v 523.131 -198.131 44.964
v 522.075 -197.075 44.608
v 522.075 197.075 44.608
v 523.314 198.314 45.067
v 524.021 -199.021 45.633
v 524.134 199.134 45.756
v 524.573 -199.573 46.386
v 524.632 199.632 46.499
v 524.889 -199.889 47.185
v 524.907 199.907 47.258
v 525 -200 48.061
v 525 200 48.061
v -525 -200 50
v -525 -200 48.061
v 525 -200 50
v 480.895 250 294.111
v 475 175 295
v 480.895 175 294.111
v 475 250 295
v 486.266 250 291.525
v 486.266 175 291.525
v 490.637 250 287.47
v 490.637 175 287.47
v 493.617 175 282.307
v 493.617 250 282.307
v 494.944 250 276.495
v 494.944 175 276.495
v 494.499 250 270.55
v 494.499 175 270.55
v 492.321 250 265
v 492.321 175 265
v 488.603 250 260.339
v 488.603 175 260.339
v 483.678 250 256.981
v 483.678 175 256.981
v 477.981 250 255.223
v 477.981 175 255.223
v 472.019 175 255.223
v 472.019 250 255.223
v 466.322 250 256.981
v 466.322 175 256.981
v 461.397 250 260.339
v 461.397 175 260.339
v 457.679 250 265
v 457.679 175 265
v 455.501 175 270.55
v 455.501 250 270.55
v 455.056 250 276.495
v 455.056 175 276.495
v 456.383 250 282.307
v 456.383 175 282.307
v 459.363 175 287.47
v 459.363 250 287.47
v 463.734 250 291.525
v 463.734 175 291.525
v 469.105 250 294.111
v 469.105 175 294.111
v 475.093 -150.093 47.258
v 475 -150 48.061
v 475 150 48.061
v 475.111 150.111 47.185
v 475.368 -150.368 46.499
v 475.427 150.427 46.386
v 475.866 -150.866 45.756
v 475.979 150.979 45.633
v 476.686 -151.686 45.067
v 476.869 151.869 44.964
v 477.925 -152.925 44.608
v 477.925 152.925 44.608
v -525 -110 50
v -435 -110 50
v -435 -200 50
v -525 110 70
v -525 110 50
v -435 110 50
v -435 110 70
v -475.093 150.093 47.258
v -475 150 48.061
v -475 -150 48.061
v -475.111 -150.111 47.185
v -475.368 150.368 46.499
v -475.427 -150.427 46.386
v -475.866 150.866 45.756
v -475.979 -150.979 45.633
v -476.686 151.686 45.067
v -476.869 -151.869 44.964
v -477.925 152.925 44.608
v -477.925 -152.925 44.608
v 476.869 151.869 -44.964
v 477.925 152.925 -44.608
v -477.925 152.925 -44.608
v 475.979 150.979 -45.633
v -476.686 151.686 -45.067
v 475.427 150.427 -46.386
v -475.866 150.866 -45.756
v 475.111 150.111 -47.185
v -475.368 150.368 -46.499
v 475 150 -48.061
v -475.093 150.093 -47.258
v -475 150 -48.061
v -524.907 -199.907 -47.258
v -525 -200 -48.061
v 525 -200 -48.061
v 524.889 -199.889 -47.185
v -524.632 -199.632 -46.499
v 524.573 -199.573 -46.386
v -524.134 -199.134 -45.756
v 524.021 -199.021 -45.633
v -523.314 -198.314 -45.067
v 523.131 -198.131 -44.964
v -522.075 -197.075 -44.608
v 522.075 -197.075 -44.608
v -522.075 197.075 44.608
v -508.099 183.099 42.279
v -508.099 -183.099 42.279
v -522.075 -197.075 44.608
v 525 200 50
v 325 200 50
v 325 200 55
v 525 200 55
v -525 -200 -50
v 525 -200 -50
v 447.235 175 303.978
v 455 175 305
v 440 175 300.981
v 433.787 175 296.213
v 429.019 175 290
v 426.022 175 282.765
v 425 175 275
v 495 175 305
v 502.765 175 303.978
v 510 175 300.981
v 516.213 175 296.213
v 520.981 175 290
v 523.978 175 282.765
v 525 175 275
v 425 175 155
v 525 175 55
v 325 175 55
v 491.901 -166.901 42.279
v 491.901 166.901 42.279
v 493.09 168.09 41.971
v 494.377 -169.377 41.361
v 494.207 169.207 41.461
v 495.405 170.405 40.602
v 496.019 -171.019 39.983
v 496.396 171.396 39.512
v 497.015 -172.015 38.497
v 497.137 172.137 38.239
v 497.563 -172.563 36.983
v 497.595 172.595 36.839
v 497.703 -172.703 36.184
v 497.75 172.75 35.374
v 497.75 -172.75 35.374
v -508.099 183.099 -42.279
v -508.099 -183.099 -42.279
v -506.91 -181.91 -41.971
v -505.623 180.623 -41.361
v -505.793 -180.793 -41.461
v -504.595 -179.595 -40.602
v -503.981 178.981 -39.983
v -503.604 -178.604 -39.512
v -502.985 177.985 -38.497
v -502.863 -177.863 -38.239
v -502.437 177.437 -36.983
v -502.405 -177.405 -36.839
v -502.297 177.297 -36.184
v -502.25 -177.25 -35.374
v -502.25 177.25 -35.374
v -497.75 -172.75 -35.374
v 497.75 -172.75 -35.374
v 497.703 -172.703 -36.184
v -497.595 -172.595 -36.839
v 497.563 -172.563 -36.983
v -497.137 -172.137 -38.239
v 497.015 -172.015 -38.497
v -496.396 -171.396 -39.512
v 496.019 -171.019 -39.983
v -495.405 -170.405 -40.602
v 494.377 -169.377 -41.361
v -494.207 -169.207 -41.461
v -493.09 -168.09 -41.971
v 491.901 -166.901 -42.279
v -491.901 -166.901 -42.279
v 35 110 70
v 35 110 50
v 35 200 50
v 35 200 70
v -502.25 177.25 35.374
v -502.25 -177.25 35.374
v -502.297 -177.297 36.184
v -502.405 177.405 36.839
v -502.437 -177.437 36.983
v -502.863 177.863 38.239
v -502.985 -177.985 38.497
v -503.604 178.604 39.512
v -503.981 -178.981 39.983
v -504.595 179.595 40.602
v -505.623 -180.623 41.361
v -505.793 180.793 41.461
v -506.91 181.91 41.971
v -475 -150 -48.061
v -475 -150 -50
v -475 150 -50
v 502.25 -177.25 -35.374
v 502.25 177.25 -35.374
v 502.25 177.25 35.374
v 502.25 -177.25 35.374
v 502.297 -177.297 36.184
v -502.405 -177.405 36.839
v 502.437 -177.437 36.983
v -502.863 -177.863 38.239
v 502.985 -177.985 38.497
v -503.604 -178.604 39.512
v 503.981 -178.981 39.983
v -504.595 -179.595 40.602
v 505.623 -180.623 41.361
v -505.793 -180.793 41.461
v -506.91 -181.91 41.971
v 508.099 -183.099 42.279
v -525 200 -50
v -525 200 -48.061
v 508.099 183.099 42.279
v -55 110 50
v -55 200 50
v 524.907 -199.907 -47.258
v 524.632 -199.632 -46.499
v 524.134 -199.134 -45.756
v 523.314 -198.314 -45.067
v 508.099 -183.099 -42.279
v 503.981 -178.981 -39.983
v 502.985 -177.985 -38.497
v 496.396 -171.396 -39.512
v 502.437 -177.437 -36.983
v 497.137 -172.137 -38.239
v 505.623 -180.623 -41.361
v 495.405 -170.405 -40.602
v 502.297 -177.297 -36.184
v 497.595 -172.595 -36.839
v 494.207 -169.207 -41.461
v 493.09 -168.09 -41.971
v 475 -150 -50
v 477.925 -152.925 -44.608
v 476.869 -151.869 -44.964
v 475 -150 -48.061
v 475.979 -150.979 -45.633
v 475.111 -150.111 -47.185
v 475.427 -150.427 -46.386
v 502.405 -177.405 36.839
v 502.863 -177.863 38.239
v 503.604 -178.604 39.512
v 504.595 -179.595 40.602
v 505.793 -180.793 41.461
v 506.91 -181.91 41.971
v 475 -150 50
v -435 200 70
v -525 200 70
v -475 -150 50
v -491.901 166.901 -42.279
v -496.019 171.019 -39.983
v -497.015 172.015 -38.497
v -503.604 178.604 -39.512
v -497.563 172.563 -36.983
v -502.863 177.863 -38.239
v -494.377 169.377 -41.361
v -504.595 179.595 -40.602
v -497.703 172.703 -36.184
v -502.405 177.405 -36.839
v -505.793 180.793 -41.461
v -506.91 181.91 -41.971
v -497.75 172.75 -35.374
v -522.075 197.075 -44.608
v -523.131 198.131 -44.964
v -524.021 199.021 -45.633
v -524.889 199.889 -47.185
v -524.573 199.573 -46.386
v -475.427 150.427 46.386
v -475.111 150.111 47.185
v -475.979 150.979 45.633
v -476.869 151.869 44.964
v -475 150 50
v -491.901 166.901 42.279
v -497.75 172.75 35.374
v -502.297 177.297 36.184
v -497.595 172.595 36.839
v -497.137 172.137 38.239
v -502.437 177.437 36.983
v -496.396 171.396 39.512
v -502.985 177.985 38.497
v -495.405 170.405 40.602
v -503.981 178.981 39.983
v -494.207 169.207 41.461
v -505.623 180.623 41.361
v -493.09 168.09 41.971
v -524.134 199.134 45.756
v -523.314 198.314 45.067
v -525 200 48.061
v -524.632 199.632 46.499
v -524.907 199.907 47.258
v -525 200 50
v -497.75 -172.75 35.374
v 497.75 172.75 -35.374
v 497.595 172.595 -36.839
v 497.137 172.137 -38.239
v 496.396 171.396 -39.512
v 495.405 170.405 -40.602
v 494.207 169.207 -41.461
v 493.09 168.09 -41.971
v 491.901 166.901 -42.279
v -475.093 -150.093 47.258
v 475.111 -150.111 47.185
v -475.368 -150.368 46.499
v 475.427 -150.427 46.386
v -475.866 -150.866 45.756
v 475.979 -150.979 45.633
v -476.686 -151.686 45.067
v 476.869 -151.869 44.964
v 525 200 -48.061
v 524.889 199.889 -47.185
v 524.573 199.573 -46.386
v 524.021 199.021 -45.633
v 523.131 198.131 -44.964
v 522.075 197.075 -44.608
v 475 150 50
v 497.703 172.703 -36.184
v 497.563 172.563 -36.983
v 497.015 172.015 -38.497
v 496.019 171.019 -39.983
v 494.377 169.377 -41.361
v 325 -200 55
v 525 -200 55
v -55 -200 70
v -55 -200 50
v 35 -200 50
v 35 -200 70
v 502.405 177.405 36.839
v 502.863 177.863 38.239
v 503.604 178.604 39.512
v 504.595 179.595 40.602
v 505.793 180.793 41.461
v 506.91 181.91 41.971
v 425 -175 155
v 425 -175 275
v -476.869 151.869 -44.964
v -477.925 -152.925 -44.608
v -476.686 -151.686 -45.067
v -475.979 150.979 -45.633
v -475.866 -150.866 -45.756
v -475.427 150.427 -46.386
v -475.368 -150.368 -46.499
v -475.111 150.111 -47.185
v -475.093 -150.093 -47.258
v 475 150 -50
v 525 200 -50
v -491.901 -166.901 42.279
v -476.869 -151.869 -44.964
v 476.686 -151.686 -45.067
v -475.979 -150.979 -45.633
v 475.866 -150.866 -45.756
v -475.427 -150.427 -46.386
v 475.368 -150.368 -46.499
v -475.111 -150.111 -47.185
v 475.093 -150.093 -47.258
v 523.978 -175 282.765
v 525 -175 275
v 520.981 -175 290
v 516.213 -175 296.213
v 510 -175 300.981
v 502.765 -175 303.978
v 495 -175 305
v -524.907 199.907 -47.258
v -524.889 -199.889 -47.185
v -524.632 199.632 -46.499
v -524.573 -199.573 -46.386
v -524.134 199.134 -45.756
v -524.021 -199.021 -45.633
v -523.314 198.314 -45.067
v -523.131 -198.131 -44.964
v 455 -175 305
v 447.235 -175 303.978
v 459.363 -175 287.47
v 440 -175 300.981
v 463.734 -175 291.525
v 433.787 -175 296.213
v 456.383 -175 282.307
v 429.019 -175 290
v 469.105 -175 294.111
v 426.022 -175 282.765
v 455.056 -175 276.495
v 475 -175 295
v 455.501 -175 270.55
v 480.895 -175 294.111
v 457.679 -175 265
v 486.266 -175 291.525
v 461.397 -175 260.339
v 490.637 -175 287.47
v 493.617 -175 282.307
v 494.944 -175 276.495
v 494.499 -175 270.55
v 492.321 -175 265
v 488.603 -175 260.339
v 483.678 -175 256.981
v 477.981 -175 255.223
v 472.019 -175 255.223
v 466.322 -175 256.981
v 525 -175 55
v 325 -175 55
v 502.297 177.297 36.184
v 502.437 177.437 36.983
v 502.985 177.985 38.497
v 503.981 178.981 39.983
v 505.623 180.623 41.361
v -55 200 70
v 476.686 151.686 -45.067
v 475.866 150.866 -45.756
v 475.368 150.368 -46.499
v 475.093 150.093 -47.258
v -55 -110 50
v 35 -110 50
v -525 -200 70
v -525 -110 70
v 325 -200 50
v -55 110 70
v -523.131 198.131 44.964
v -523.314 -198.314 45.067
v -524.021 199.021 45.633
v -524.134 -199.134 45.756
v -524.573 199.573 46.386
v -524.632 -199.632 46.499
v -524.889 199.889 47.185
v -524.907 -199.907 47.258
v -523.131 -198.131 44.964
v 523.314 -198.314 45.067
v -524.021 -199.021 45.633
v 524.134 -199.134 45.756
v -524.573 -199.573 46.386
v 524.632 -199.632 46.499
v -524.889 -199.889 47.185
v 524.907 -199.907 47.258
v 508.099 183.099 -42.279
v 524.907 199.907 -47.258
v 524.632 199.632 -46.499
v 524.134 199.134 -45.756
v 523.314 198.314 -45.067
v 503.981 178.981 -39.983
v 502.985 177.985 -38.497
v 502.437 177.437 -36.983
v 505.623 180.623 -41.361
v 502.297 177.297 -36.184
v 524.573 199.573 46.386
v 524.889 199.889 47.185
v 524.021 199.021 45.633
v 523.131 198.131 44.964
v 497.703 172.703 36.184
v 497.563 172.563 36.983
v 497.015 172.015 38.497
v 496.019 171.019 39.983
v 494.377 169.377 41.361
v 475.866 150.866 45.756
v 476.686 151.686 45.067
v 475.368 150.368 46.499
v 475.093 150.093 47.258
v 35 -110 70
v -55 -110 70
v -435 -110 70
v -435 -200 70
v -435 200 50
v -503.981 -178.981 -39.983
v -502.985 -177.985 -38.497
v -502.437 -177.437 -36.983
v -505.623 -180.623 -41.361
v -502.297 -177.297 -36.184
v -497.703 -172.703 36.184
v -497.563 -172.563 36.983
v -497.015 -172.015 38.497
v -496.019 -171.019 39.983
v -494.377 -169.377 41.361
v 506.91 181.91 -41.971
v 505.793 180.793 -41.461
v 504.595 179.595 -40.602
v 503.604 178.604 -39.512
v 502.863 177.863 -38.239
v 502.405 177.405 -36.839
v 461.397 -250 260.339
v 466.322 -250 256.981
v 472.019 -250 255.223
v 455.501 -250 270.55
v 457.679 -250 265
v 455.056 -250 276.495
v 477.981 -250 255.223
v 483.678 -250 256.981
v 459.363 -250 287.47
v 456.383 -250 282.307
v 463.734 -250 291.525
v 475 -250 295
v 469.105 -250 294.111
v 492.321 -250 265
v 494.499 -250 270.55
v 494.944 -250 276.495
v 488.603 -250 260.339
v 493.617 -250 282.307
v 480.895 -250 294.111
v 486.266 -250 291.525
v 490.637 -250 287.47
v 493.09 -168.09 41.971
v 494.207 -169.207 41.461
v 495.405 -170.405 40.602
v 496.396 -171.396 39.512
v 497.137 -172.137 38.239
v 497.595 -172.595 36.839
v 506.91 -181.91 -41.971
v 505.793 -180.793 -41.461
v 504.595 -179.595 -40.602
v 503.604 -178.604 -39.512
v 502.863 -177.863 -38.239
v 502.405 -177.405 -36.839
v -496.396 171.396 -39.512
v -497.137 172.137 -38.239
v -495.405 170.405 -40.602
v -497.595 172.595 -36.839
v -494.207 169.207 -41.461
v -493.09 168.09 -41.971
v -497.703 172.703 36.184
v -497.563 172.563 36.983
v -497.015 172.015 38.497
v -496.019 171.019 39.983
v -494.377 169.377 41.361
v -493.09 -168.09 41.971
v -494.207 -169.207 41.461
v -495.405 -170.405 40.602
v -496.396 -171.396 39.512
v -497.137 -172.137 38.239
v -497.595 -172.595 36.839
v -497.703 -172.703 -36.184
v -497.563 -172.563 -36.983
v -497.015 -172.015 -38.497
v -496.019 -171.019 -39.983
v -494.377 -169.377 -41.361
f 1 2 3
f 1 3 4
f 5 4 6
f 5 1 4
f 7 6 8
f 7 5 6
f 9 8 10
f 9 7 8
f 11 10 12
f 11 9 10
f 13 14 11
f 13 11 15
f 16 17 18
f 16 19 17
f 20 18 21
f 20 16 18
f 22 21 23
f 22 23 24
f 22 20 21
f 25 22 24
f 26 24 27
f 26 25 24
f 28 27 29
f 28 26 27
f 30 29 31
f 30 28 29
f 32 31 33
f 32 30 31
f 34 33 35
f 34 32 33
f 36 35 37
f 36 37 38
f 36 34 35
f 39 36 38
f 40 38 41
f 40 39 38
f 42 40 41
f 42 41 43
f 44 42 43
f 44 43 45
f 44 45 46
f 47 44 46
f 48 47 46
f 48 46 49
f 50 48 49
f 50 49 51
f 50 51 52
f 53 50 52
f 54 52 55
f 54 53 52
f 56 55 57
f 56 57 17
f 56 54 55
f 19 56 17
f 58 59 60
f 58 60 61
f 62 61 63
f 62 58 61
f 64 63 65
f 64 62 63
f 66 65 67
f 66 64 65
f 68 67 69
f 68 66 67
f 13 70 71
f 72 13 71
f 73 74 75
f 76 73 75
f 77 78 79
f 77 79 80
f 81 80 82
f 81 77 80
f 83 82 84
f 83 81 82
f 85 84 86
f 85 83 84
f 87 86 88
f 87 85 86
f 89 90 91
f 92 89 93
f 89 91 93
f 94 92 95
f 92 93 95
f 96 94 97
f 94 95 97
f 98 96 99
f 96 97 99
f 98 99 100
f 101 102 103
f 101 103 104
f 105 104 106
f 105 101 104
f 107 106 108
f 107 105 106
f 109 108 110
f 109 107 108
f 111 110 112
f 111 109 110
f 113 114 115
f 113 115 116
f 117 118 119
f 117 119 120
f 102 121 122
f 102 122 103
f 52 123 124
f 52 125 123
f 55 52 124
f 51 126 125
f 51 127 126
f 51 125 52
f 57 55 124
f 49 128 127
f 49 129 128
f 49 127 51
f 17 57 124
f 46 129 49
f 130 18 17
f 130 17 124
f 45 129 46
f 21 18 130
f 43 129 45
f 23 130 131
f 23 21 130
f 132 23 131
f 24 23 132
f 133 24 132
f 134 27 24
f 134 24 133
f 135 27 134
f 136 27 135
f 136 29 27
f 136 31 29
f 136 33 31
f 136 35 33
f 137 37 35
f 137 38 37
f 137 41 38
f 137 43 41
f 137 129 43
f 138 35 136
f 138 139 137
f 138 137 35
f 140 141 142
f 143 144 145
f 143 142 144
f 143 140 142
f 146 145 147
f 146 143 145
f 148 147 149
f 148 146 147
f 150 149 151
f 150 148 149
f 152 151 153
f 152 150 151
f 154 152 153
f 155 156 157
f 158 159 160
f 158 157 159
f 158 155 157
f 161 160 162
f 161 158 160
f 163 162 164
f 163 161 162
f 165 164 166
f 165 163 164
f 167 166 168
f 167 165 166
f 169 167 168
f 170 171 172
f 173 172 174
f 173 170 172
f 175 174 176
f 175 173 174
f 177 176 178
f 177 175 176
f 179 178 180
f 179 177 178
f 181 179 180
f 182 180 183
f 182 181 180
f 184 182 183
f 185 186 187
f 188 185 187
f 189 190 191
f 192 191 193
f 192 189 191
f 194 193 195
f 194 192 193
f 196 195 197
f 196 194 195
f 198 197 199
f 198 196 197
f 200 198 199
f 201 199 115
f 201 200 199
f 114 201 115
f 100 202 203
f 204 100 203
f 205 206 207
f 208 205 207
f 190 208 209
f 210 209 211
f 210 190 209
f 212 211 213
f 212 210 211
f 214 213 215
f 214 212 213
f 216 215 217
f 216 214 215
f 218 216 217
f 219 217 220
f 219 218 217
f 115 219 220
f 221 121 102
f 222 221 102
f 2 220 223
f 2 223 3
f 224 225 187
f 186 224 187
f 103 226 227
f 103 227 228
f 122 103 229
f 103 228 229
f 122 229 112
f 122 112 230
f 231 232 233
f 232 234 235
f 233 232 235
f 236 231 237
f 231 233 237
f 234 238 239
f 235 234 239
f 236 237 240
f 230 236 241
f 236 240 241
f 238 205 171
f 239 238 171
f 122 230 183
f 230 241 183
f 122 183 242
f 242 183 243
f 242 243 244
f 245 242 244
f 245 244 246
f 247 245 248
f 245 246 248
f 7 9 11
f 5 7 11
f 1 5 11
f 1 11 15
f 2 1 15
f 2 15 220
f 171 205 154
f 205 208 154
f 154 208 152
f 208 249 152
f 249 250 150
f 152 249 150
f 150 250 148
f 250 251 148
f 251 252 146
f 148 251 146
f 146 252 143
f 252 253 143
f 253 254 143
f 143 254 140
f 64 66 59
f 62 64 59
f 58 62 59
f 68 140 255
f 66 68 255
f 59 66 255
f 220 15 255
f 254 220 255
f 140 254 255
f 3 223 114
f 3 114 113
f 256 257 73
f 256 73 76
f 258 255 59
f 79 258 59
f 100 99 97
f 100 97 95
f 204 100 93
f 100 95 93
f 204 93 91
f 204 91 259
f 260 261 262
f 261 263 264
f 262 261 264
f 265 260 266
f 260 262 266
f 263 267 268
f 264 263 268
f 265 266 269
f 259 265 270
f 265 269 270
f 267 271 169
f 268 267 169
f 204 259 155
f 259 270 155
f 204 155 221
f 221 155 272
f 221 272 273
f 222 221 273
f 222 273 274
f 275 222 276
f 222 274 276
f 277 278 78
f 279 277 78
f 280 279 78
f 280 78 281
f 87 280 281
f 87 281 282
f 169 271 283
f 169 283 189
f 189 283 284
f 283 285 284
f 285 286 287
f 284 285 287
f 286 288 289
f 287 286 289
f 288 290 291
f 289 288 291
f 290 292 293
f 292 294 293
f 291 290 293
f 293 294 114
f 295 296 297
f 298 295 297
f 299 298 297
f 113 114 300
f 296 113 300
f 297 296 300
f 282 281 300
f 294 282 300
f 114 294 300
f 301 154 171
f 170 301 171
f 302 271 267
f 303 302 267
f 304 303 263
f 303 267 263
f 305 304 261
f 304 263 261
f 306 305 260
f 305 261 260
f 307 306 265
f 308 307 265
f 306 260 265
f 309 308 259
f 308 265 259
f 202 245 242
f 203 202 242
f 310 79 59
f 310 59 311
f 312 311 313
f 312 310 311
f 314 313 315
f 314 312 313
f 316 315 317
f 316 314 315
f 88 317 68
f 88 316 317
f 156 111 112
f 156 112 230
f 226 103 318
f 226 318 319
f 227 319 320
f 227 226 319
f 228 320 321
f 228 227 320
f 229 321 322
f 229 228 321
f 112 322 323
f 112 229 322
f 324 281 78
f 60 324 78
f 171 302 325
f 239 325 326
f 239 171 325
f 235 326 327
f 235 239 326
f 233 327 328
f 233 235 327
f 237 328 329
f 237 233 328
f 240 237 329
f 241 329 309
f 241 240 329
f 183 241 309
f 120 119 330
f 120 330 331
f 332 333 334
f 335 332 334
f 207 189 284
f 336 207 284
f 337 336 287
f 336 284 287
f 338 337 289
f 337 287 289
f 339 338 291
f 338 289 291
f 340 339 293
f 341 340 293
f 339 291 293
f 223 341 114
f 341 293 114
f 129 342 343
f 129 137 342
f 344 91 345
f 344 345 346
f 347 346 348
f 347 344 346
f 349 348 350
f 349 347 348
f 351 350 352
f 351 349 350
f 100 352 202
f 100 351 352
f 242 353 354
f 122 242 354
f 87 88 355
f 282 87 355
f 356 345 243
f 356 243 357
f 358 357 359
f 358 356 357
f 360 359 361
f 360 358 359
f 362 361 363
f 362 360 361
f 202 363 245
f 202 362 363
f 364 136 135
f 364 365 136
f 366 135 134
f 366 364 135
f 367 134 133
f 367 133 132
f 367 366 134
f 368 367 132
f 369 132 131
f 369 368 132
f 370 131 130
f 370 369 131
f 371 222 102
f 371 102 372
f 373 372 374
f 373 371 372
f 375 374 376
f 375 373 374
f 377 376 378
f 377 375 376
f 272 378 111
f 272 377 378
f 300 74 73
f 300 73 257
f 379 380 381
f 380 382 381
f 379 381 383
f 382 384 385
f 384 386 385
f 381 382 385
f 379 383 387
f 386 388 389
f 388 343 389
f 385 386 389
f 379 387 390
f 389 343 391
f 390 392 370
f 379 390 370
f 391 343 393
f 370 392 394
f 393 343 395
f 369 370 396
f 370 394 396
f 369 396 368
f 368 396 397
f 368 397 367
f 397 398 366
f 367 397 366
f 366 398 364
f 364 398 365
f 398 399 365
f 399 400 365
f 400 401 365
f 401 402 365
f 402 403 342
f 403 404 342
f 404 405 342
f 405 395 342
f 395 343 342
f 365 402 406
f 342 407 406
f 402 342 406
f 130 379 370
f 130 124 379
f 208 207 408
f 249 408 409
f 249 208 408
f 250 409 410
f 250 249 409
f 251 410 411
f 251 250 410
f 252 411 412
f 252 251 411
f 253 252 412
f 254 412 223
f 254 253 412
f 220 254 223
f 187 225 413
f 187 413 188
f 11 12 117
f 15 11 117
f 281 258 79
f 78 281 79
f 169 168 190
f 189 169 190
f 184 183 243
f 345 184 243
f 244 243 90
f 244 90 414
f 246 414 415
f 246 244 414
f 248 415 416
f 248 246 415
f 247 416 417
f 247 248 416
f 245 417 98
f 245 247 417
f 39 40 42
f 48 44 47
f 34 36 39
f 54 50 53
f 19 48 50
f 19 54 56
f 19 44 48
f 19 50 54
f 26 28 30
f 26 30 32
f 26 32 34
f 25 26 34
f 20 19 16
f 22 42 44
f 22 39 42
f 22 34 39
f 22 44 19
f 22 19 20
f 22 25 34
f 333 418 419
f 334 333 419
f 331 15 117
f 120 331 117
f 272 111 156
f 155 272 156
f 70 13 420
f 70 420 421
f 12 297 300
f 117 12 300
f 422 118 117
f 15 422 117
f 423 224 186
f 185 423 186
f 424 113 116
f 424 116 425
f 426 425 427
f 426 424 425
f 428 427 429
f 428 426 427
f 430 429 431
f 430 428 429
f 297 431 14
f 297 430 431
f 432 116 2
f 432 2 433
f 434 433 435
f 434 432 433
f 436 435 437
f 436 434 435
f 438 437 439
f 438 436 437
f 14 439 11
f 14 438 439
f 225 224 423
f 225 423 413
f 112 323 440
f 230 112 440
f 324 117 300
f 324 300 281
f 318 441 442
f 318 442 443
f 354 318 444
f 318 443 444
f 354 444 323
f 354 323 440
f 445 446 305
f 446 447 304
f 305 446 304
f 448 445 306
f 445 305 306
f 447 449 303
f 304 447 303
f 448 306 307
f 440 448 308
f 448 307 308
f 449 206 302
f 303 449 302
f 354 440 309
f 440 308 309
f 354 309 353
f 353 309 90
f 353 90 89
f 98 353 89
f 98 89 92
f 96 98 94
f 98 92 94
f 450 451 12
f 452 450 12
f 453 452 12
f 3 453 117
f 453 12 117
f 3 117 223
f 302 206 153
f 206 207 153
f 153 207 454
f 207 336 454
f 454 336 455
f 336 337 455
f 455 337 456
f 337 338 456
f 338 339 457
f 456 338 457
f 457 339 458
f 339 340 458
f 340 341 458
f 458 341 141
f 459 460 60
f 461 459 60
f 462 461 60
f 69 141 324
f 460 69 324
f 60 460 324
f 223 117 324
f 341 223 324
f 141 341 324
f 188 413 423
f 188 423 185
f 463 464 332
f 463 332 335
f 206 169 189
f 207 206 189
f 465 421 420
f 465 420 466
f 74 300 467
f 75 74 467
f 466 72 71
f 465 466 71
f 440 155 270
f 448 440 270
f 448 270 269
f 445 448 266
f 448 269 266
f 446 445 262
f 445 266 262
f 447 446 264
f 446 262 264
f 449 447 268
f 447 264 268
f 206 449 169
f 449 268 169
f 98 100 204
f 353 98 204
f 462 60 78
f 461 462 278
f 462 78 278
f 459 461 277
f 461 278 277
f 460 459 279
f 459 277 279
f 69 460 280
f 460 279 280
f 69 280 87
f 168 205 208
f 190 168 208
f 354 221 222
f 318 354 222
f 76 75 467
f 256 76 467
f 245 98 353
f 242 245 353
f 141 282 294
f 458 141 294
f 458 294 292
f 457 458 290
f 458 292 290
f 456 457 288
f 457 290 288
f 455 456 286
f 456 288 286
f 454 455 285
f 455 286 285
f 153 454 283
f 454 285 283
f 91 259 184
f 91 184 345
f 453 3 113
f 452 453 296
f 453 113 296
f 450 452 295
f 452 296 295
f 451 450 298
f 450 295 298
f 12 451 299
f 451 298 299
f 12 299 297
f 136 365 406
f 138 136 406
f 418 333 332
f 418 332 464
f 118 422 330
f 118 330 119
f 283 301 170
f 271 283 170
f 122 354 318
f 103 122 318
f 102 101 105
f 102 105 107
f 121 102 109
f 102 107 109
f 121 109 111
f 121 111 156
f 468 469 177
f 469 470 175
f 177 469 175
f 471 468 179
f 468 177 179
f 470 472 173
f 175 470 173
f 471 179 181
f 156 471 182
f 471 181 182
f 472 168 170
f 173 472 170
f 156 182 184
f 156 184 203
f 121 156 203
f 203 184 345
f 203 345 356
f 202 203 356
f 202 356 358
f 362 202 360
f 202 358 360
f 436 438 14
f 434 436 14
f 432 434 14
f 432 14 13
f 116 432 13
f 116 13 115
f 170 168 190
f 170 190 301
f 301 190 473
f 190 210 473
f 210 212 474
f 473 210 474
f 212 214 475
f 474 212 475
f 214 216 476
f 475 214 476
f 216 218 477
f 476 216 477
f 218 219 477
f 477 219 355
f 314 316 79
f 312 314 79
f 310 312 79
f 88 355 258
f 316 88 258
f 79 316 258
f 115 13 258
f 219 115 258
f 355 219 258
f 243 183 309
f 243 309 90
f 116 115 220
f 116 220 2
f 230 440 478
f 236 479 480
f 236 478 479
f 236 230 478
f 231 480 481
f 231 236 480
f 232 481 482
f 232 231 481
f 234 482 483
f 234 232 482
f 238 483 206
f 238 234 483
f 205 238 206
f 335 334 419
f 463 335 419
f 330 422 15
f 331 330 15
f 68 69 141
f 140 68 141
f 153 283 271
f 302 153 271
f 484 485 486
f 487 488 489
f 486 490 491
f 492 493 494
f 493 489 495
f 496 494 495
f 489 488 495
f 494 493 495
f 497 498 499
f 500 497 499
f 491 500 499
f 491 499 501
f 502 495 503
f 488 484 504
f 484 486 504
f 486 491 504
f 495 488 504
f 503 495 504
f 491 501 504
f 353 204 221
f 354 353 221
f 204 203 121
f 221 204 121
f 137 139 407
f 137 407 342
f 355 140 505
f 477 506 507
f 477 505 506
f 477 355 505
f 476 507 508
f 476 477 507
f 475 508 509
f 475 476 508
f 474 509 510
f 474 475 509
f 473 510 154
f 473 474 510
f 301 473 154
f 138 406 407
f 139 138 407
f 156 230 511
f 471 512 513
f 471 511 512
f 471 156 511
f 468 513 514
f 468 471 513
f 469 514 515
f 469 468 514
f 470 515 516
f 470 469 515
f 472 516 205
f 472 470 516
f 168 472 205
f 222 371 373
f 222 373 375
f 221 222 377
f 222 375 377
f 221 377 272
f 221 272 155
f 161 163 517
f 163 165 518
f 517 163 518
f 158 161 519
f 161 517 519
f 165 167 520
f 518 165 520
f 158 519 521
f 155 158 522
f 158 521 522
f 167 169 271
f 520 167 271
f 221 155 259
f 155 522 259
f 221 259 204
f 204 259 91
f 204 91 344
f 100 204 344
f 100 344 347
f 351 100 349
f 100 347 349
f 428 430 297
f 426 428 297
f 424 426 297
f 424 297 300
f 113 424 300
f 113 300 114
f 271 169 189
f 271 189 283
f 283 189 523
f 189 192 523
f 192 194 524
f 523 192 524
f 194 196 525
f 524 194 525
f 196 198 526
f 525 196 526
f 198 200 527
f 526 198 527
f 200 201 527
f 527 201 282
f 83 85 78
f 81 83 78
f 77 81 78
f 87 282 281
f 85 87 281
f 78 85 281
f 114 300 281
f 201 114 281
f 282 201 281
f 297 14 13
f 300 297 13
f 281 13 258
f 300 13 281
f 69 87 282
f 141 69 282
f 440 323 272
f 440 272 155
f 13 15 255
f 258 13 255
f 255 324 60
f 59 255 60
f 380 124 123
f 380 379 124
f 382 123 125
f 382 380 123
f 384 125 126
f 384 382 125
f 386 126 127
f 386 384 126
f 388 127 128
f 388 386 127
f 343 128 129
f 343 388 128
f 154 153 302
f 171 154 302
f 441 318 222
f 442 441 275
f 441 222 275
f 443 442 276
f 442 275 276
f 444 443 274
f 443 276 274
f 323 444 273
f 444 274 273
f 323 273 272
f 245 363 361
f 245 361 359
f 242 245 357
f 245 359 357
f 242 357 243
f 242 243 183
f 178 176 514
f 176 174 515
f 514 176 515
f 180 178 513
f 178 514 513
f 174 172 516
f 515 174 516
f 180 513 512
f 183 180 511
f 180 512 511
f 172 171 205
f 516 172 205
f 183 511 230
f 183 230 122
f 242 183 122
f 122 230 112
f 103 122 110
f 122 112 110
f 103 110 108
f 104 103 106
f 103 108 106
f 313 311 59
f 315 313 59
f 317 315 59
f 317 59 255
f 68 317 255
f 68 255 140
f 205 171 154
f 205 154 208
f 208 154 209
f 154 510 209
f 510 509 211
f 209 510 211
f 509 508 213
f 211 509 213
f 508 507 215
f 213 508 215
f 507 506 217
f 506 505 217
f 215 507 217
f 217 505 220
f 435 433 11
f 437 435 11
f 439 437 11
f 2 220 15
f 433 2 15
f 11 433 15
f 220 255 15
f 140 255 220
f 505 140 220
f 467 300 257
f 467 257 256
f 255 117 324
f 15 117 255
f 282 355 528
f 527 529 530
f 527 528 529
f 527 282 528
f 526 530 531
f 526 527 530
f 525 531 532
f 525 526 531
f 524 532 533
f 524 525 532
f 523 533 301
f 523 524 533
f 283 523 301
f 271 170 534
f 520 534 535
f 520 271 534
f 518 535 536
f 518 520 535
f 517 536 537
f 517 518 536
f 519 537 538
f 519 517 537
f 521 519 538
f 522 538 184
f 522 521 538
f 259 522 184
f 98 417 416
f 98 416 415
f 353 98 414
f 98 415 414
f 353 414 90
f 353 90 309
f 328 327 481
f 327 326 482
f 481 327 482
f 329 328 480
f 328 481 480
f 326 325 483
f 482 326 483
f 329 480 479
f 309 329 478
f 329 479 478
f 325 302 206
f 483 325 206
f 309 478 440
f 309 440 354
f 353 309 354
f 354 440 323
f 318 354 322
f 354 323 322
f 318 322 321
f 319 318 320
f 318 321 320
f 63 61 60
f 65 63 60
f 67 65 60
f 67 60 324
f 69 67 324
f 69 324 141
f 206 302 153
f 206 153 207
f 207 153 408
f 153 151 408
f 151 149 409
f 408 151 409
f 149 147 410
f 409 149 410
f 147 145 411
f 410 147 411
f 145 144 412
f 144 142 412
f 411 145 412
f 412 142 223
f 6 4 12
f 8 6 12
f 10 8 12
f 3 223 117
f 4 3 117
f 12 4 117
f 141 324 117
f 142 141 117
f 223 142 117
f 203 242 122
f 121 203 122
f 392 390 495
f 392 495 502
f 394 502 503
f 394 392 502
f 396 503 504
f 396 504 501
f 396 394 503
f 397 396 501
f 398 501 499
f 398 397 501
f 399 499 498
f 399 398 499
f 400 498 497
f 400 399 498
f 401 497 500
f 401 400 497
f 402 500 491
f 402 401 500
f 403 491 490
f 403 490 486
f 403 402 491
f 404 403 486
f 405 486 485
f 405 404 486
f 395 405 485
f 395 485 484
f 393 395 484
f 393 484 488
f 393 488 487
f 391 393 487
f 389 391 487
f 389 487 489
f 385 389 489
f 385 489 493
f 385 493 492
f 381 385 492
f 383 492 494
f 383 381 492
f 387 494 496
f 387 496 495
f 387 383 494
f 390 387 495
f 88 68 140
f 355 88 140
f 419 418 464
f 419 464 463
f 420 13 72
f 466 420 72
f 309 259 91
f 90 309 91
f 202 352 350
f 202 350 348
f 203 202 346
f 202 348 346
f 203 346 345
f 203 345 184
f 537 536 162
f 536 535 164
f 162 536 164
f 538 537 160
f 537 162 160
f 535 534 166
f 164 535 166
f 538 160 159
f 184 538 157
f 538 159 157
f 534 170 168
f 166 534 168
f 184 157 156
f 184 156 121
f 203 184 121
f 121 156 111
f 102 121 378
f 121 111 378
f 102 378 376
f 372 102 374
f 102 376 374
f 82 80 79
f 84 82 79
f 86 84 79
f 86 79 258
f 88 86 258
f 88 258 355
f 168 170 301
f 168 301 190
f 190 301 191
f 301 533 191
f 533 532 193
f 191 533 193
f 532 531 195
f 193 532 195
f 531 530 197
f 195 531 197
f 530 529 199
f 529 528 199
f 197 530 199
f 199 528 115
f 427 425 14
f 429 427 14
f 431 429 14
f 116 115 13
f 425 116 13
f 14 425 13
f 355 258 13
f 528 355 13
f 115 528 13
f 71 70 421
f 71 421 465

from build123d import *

# Parameters (mm, degrees)
SB_BEAM_CONFIGURED_100_X_8_1_DEPTH      = 1056.901699437
SB_BEAM_CONFIGURED_100_X_8_1_DEPTH_BACK = 56.901699437
SB_BEAM_CONFIGURED_100_X_8_1_2_DEPTH    = 463.803398875
SB_BEAM_CONFIGURED_100_X_8_1_3_DEPTH    = 1113.803398875
SB_BEAM_CONFIGURED_100_X_8_1_4_DEPTH    = 463.803398875
SKETCH17_W                              = 90
SKETCH17_H                              = 90
BOSS_EXTRUDE1_DEPTH                     = 20
BOSS_EXTRUDE1_2_DEPTH                   = 20
BOSS_EXTRUDE1_3_DEPTH                   = 20
BOSS_EXTRUDE1_4_DEPTH                   = 20
SKETCH18_W                              = 200
SKETCH18_H                              = 400
BOSS_EXTRUDE2_DEPTH                     = 5
BOSS_EXTRUDE3_DEPTH                     = 175
SKETCH21_R                              = 20
BOSS_EXTRUDE4_DEPTH                     = 250
FILLET1_R                               = 30


with BuildPart() as part:
    # Sketch16 → Sb beam - configured 100 X 8(1) (new, two sides)
    with BuildSketch(Plane(origin=(500, 175, 0), x_dir=(0, -1, 0), z_dir=(-1, 0, 0))) as sb_beam_configured_100_x_8_1_sk:
        with BuildLine():
            Line((-25, -50), (-25, -48.060671023))
            ThreePointArc((-25, -48.060671023), (-24.17058332, -45.798374682), (-22.075437296, -44.608299096))
            Line((-22.075437296, -44.608299096), (-8.099125408, -42.278743853))
            ThreePointArc((-8.099125408, -42.278743853), (-3.90883336, -39.898592681), (-2.25, -35.374))
            Line((-2.25, -35.374), (-2.25, 35.374))
            ThreePointArc((-2.25, 35.374), (-3.90883336, 39.898592681), (-8.099125408, 42.278743853))
            Line((-8.099125408, 42.278743853), (-22.075437296, 44.608299096))
            ThreePointArc((-22.075437296, 44.608299096), (-24.17058332, 45.798374682), (-25, 48.060671023))
            Line((-25, 48.060671023), (-25, 50))
            Line((-25, 50), (25, 50))
            Line((25, 50), (25, 48.060671023))
            ThreePointArc((25, 48.060671023), (24.17058332, 45.798374682), (22.075437296, 44.608299096))
            Line((22.075437296, 44.608299096), (8.099125408, 42.278743853))
            ThreePointArc((8.099125408, 42.278743853), (3.90883336, 39.898592681), (2.25, 35.374))
            Line((2.25, 35.374), (2.25, -35.374))
            ThreePointArc((2.25, -35.374), (3.90883336, -39.898592681), (8.099125408, -42.278743853))
            Line((8.099125408, -42.278743853), (22.075437296, -44.608299096))
            ThreePointArc((22.075437296, -44.608299096), (24.17058332, -45.798374682), (25, -48.060671023))
            Line((25, -48.060671023), (25, -50))
            Line((25, -50), (-25, -50))
        make_face()
    extrude(amount=SB_BEAM_CONFIGURED_100_X_8_1_DEPTH)
    extrude(sb_beam_configured_100_x_8_1_sk.sketch, amount=-SB_BEAM_CONFIGURED_100_X_8_1_DEPTH_BACK)

    # Sb beam - configured 100 X 8(1) mitre 1
    split(bisect_by=Plane(origin=(500, 175, 0), x_dir=(-0.707106781, -0.707106781, 0), z_dir=(-0.707106781, 0.707106781, 0)), keep=Keep.TOP)

    # Sb beam - configured 100 X 8(1) mitre 2
    split(bisect_by=Plane(origin=(-500, 175, 0), x_dir=(-0.707106781, 0.707106781, 0), z_dir=(0.707106781, 0.707106781, 0)), keep=Keep.TOP)


with BuildPart() as body_2:
    # Sketch16 on segment 2 (carried to segment 2) → Sb beam - configured 100 X 8_1 2 (new body)
    with BuildSketch(Plane(origin=(-500, 231.901699437, 0), x_dir=(1, 0, 0), z_dir=(0, -1, 0))):
        with BuildLine():
            Line((-25, -50), (-25, -48.060671023))
            ThreePointArc((-25, -48.060671023), (-24.17058332, -45.798374682), (-22.075437296, -44.608299096))
            Line((-22.075437296, -44.608299096), (-8.099125408, -42.278743853))
            ThreePointArc((-8.099125408, -42.278743853), (-3.90883336, -39.898592681), (-2.25, -35.374))
            Line((-2.25, -35.374), (-2.25, 35.374))
            ThreePointArc((-2.25, 35.374), (-3.90883336, 39.898592681), (-8.099125408, 42.278743853))
            Line((-8.099125408, 42.278743853), (-22.075437296, 44.608299096))
            ThreePointArc((-22.075437296, 44.608299096), (-24.17058332, 45.798374682), (-25, 48.060671023))
            Line((-25, 48.060671023), (-25, 50))
            Line((-25, 50), (25, 50))
            Line((25, 50), (25, 48.060671023))
            ThreePointArc((25, 48.060671023), (24.17058332, 45.798374682), (22.075437296, 44.608299096))
            Line((22.075437296, 44.608299096), (8.099125408, 42.278743853))
            ThreePointArc((8.099125408, 42.278743853), (3.90883336, 39.898592681), (2.25, 35.374))
            Line((2.25, 35.374), (2.25, -35.374))
            ThreePointArc((2.25, -35.374), (3.90883336, -39.898592681), (8.099125408, -42.278743853))
            Line((8.099125408, -42.278743853), (22.075437296, -44.608299096))
            ThreePointArc((22.075437296, -44.608299096), (24.17058332, -45.798374682), (25, -48.060671023))
            Line((25, -48.060671023), (25, -50))
            Line((25, -50), (-25, -50))
        make_face()
    extrude(amount=SB_BEAM_CONFIGURED_100_X_8_1_2_DEPTH)

    # Sb beam - configured 100 X 8_1 2 mitre 1
    split(bisect_by=Plane(origin=(-500, 175, 0), x_dir=(0.707106781, -0.707106781, 0), z_dir=(-0.707106781, -0.707106781, 0)), keep=Keep.TOP)

    # Sb beam - configured 100 X 8_1 2 mitre 2
    split(bisect_by=Plane(origin=(-500, -175, 0), x_dir=(-0.707106781, -0.707106781, 0), z_dir=(-0.707106781, 0.707106781, 0)), keep=Keep.TOP)


with BuildPart() as body_3:
    # Sketch16 on segment 3 (carried to segment 3) → Sb beam - configured 100 X 8_1 3 (new body)
    with BuildSketch(Plane(origin=(-556.901699437, -175, 0), x_dir=(0, 1, 0), z_dir=(1, 0, 0))):
        with BuildLine():
            Line((-25, -50), (-25, -48.060671023))
            ThreePointArc((-25, -48.060671023), (-24.17058332, -45.798374682), (-22.075437296, -44.608299096))
            Line((-22.075437296, -44.608299096), (-8.099125408, -42.278743853))
            ThreePointArc((-8.099125408, -42.278743853), (-3.90883336, -39.898592681), (-2.25, -35.374))
            Line((-2.25, -35.374), (-2.25, 35.374))
            ThreePointArc((-2.25, 35.374), (-3.90883336, 39.898592681), (-8.099125408, 42.278743853))
            Line((-8.099125408, 42.278743853), (-22.075437296, 44.608299096))
            ThreePointArc((-22.075437296, 44.608299096), (-24.17058332, 45.798374682), (-25, 48.060671023))
            Line((-25, 48.060671023), (-25, 50))
            Line((-25, 50), (25, 50))
            Line((25, 50), (25, 48.060671023))
            ThreePointArc((25, 48.060671023), (24.17058332, 45.798374682), (22.075437296, 44.608299096))
            Line((22.075437296, 44.608299096), (8.099125408, 42.278743853))
            ThreePointArc((8.099125408, 42.278743853), (3.90883336, 39.898592681), (2.25, 35.374))
            Line((2.25, 35.374), (2.25, -35.374))
            ThreePointArc((2.25, -35.374), (3.90883336, -39.898592681), (8.099125408, -42.278743853))
            Line((8.099125408, -42.278743853), (22.075437296, -44.608299096))
            ThreePointArc((22.075437296, -44.608299096), (24.17058332, -45.798374682), (25, -48.060671023))
            Line((25, -48.060671023), (25, -50))
            Line((25, -50), (-25, -50))
        make_face()
    extrude(amount=SB_BEAM_CONFIGURED_100_X_8_1_3_DEPTH)

    # Sb beam - configured 100 X 8_1 3 mitre 1
    split(bisect_by=Plane(origin=(500, -175, 0), x_dir=(0.707106781, -0.707106781, 0), z_dir=(-0.707106781, -0.707106781, 0)), keep=Keep.TOP)

    # Sb beam - configured 100 X 8_1 3 mitre 2
    split(bisect_by=Plane(origin=(-500, -175, 0), x_dir=(0.707106781, 0.707106781, 0), z_dir=(0.707106781, -0.707106781, 0)), keep=Keep.TOP)


with BuildPart() as body_4:
    # Sketch16 on segment 4 (carried to segment 4) → Sb beam - configured 100 X 8_1 4 (new body)
    with BuildSketch(Plane(origin=(500, -231.901699437, 0), x_dir=(-1, 0, 0), z_dir=(0, 1, 0))):
        with BuildLine():
            Line((-25, -50), (-25, -48.060671023))
            ThreePointArc((-25, -48.060671023), (-24.17058332, -45.798374682), (-22.075437296, -44.608299096))
            Line((-22.075437296, -44.608299096), (-8.099125408, -42.278743853))
            ThreePointArc((-8.099125408, -42.278743853), (-3.90883336, -39.898592681), (-2.25, -35.374))
            Line((-2.25, -35.374), (-2.25, 35.374))
            ThreePointArc((-2.25, 35.374), (-3.90883336, 39.898592681), (-8.099125408, 42.278743853))
            Line((-8.099125408, 42.278743853), (-22.075437296, 44.608299096))
            ThreePointArc((-22.075437296, 44.608299096), (-24.17058332, 45.798374682), (-25, 48.060671023))
            Line((-25, 48.060671023), (-25, 50))
            Line((-25, 50), (25, 50))
            Line((25, 50), (25, 48.060671023))
            ThreePointArc((25, 48.060671023), (24.17058332, 45.798374682), (22.075437296, 44.608299096))
            Line((22.075437296, 44.608299096), (8.099125408, 42.278743853))
            ThreePointArc((8.099125408, 42.278743853), (3.90883336, 39.898592681), (2.25, 35.374))
            Line((2.25, 35.374), (2.25, -35.374))
            ThreePointArc((2.25, -35.374), (3.90883336, -39.898592681), (8.099125408, -42.278743853))
            Line((8.099125408, -42.278743853), (22.075437296, -44.608299096))
            ThreePointArc((22.075437296, -44.608299096), (24.17058332, -45.798374682), (25, -48.060671023))
            Line((25, -48.060671023), (25, -50))
            Line((25, -50), (-25, -50))
        make_face()
    extrude(amount=SB_BEAM_CONFIGURED_100_X_8_1_4_DEPTH)

    # Sb beam - configured 100 X 8_1 4 mitre 1
    split(bisect_by=Plane(origin=(500, 175, 0), x_dir=(0.707106781, 0.707106781, 0), z_dir=(0.707106781, -0.707106781, 0)), keep=Keep.TOP)

    # Sb beam - configured 100 X 8_1 4 mitre 2
    split(bisect_by=Plane(origin=(500, -175, 0), x_dir=(-0.707106781, 0.707106781, 0), z_dir=(0.707106781, 0.707106781, 0)), keep=Keep.TOP)


with BuildPart() as body_5:
    # Sketch17 → Boss-Extrude1 (new body)
    with BuildSketch(Plane.XY.offset(50)):
        with Locations((-480, 155)):
            Rectangle(SKETCH17_W, SKETCH17_H)
    extrude(amount=BOSS_EXTRUDE1_DEPTH)


with BuildPart() as body_6:
    # Sketch17 → Boss-Extrude1 2 (new body)
    with BuildSketch(Plane.XY.offset(50)):
        with Locations((-480, -155)):
            Rectangle(SKETCH17_W, SKETCH17_H)
    extrude(amount=BOSS_EXTRUDE1_2_DEPTH)


with BuildPart() as body_7:
    # Sketch17 → Boss-Extrude1 3 (new body)
    with BuildSketch(Plane.XY.offset(50)):
        with Locations((-10, 155)):
            Rectangle(SKETCH17_W, SKETCH17_H)
    extrude(amount=BOSS_EXTRUDE1_3_DEPTH)


with BuildPart() as body_8:
    # Sketch17 → Boss-Extrude1 4 (new body)
    with BuildSketch(Plane.XY.offset(50)):
        with Locations((-10, -155)):
            Rectangle(SKETCH17_W, SKETCH17_H)
    extrude(amount=BOSS_EXTRUDE1_4_DEPTH)


with BuildPart() as body_9:
    # Sketch18 → Boss-Extrude2 (new body)
    with BuildSketch(Plane.XY.offset(50)):
        with Locations((425, 0)):
            Rectangle(SKETCH18_W, SKETCH18_H)
    extrude(amount=BOSS_EXTRUDE2_DEPTH)


with BuildPart() as body_10:
    # Sketch20 → Boss-Extrude3 (new, symmetric)
    with BuildSketch(Plane(origin=(0, 0, 0), x_dir=(1, 0, 0), z_dir=(0, 1, 0))):
        Polygon((525, -55), (325, -55), (425, -155), (425, -305), (525, -305), align=None)
    extrude(amount=BOSS_EXTRUDE3_DEPTH, both=True)

    # Sketch21 → Boss-Extrude4 (add, symmetric)
    with BuildSketch(Plane(origin=(0, 0, 0), x_dir=(1, 0, 0), z_dir=(0, 1, 0))):
        with Locations(Location((475, -275, 0), (0, 0, 270))):
            Circle(SKETCH21_R)
    extrude(amount=BOSS_EXTRUDE4_DEPTH, both=True)

    # Fillet1
    fillet1_edges = [body_10.edges().sort_by_distance(p)[0] for p in [
        (525, 0, 305),
        (425, 0, 305),
    ]]
    fillet(fillet1_edges, radius=FILLET1_R)


solid = Compound([part.part, body_2.part, body_3.part, body_4.part, body_5.part, body_6.part, body_7.part, body_8.part, body_9.part, body_10.part])
